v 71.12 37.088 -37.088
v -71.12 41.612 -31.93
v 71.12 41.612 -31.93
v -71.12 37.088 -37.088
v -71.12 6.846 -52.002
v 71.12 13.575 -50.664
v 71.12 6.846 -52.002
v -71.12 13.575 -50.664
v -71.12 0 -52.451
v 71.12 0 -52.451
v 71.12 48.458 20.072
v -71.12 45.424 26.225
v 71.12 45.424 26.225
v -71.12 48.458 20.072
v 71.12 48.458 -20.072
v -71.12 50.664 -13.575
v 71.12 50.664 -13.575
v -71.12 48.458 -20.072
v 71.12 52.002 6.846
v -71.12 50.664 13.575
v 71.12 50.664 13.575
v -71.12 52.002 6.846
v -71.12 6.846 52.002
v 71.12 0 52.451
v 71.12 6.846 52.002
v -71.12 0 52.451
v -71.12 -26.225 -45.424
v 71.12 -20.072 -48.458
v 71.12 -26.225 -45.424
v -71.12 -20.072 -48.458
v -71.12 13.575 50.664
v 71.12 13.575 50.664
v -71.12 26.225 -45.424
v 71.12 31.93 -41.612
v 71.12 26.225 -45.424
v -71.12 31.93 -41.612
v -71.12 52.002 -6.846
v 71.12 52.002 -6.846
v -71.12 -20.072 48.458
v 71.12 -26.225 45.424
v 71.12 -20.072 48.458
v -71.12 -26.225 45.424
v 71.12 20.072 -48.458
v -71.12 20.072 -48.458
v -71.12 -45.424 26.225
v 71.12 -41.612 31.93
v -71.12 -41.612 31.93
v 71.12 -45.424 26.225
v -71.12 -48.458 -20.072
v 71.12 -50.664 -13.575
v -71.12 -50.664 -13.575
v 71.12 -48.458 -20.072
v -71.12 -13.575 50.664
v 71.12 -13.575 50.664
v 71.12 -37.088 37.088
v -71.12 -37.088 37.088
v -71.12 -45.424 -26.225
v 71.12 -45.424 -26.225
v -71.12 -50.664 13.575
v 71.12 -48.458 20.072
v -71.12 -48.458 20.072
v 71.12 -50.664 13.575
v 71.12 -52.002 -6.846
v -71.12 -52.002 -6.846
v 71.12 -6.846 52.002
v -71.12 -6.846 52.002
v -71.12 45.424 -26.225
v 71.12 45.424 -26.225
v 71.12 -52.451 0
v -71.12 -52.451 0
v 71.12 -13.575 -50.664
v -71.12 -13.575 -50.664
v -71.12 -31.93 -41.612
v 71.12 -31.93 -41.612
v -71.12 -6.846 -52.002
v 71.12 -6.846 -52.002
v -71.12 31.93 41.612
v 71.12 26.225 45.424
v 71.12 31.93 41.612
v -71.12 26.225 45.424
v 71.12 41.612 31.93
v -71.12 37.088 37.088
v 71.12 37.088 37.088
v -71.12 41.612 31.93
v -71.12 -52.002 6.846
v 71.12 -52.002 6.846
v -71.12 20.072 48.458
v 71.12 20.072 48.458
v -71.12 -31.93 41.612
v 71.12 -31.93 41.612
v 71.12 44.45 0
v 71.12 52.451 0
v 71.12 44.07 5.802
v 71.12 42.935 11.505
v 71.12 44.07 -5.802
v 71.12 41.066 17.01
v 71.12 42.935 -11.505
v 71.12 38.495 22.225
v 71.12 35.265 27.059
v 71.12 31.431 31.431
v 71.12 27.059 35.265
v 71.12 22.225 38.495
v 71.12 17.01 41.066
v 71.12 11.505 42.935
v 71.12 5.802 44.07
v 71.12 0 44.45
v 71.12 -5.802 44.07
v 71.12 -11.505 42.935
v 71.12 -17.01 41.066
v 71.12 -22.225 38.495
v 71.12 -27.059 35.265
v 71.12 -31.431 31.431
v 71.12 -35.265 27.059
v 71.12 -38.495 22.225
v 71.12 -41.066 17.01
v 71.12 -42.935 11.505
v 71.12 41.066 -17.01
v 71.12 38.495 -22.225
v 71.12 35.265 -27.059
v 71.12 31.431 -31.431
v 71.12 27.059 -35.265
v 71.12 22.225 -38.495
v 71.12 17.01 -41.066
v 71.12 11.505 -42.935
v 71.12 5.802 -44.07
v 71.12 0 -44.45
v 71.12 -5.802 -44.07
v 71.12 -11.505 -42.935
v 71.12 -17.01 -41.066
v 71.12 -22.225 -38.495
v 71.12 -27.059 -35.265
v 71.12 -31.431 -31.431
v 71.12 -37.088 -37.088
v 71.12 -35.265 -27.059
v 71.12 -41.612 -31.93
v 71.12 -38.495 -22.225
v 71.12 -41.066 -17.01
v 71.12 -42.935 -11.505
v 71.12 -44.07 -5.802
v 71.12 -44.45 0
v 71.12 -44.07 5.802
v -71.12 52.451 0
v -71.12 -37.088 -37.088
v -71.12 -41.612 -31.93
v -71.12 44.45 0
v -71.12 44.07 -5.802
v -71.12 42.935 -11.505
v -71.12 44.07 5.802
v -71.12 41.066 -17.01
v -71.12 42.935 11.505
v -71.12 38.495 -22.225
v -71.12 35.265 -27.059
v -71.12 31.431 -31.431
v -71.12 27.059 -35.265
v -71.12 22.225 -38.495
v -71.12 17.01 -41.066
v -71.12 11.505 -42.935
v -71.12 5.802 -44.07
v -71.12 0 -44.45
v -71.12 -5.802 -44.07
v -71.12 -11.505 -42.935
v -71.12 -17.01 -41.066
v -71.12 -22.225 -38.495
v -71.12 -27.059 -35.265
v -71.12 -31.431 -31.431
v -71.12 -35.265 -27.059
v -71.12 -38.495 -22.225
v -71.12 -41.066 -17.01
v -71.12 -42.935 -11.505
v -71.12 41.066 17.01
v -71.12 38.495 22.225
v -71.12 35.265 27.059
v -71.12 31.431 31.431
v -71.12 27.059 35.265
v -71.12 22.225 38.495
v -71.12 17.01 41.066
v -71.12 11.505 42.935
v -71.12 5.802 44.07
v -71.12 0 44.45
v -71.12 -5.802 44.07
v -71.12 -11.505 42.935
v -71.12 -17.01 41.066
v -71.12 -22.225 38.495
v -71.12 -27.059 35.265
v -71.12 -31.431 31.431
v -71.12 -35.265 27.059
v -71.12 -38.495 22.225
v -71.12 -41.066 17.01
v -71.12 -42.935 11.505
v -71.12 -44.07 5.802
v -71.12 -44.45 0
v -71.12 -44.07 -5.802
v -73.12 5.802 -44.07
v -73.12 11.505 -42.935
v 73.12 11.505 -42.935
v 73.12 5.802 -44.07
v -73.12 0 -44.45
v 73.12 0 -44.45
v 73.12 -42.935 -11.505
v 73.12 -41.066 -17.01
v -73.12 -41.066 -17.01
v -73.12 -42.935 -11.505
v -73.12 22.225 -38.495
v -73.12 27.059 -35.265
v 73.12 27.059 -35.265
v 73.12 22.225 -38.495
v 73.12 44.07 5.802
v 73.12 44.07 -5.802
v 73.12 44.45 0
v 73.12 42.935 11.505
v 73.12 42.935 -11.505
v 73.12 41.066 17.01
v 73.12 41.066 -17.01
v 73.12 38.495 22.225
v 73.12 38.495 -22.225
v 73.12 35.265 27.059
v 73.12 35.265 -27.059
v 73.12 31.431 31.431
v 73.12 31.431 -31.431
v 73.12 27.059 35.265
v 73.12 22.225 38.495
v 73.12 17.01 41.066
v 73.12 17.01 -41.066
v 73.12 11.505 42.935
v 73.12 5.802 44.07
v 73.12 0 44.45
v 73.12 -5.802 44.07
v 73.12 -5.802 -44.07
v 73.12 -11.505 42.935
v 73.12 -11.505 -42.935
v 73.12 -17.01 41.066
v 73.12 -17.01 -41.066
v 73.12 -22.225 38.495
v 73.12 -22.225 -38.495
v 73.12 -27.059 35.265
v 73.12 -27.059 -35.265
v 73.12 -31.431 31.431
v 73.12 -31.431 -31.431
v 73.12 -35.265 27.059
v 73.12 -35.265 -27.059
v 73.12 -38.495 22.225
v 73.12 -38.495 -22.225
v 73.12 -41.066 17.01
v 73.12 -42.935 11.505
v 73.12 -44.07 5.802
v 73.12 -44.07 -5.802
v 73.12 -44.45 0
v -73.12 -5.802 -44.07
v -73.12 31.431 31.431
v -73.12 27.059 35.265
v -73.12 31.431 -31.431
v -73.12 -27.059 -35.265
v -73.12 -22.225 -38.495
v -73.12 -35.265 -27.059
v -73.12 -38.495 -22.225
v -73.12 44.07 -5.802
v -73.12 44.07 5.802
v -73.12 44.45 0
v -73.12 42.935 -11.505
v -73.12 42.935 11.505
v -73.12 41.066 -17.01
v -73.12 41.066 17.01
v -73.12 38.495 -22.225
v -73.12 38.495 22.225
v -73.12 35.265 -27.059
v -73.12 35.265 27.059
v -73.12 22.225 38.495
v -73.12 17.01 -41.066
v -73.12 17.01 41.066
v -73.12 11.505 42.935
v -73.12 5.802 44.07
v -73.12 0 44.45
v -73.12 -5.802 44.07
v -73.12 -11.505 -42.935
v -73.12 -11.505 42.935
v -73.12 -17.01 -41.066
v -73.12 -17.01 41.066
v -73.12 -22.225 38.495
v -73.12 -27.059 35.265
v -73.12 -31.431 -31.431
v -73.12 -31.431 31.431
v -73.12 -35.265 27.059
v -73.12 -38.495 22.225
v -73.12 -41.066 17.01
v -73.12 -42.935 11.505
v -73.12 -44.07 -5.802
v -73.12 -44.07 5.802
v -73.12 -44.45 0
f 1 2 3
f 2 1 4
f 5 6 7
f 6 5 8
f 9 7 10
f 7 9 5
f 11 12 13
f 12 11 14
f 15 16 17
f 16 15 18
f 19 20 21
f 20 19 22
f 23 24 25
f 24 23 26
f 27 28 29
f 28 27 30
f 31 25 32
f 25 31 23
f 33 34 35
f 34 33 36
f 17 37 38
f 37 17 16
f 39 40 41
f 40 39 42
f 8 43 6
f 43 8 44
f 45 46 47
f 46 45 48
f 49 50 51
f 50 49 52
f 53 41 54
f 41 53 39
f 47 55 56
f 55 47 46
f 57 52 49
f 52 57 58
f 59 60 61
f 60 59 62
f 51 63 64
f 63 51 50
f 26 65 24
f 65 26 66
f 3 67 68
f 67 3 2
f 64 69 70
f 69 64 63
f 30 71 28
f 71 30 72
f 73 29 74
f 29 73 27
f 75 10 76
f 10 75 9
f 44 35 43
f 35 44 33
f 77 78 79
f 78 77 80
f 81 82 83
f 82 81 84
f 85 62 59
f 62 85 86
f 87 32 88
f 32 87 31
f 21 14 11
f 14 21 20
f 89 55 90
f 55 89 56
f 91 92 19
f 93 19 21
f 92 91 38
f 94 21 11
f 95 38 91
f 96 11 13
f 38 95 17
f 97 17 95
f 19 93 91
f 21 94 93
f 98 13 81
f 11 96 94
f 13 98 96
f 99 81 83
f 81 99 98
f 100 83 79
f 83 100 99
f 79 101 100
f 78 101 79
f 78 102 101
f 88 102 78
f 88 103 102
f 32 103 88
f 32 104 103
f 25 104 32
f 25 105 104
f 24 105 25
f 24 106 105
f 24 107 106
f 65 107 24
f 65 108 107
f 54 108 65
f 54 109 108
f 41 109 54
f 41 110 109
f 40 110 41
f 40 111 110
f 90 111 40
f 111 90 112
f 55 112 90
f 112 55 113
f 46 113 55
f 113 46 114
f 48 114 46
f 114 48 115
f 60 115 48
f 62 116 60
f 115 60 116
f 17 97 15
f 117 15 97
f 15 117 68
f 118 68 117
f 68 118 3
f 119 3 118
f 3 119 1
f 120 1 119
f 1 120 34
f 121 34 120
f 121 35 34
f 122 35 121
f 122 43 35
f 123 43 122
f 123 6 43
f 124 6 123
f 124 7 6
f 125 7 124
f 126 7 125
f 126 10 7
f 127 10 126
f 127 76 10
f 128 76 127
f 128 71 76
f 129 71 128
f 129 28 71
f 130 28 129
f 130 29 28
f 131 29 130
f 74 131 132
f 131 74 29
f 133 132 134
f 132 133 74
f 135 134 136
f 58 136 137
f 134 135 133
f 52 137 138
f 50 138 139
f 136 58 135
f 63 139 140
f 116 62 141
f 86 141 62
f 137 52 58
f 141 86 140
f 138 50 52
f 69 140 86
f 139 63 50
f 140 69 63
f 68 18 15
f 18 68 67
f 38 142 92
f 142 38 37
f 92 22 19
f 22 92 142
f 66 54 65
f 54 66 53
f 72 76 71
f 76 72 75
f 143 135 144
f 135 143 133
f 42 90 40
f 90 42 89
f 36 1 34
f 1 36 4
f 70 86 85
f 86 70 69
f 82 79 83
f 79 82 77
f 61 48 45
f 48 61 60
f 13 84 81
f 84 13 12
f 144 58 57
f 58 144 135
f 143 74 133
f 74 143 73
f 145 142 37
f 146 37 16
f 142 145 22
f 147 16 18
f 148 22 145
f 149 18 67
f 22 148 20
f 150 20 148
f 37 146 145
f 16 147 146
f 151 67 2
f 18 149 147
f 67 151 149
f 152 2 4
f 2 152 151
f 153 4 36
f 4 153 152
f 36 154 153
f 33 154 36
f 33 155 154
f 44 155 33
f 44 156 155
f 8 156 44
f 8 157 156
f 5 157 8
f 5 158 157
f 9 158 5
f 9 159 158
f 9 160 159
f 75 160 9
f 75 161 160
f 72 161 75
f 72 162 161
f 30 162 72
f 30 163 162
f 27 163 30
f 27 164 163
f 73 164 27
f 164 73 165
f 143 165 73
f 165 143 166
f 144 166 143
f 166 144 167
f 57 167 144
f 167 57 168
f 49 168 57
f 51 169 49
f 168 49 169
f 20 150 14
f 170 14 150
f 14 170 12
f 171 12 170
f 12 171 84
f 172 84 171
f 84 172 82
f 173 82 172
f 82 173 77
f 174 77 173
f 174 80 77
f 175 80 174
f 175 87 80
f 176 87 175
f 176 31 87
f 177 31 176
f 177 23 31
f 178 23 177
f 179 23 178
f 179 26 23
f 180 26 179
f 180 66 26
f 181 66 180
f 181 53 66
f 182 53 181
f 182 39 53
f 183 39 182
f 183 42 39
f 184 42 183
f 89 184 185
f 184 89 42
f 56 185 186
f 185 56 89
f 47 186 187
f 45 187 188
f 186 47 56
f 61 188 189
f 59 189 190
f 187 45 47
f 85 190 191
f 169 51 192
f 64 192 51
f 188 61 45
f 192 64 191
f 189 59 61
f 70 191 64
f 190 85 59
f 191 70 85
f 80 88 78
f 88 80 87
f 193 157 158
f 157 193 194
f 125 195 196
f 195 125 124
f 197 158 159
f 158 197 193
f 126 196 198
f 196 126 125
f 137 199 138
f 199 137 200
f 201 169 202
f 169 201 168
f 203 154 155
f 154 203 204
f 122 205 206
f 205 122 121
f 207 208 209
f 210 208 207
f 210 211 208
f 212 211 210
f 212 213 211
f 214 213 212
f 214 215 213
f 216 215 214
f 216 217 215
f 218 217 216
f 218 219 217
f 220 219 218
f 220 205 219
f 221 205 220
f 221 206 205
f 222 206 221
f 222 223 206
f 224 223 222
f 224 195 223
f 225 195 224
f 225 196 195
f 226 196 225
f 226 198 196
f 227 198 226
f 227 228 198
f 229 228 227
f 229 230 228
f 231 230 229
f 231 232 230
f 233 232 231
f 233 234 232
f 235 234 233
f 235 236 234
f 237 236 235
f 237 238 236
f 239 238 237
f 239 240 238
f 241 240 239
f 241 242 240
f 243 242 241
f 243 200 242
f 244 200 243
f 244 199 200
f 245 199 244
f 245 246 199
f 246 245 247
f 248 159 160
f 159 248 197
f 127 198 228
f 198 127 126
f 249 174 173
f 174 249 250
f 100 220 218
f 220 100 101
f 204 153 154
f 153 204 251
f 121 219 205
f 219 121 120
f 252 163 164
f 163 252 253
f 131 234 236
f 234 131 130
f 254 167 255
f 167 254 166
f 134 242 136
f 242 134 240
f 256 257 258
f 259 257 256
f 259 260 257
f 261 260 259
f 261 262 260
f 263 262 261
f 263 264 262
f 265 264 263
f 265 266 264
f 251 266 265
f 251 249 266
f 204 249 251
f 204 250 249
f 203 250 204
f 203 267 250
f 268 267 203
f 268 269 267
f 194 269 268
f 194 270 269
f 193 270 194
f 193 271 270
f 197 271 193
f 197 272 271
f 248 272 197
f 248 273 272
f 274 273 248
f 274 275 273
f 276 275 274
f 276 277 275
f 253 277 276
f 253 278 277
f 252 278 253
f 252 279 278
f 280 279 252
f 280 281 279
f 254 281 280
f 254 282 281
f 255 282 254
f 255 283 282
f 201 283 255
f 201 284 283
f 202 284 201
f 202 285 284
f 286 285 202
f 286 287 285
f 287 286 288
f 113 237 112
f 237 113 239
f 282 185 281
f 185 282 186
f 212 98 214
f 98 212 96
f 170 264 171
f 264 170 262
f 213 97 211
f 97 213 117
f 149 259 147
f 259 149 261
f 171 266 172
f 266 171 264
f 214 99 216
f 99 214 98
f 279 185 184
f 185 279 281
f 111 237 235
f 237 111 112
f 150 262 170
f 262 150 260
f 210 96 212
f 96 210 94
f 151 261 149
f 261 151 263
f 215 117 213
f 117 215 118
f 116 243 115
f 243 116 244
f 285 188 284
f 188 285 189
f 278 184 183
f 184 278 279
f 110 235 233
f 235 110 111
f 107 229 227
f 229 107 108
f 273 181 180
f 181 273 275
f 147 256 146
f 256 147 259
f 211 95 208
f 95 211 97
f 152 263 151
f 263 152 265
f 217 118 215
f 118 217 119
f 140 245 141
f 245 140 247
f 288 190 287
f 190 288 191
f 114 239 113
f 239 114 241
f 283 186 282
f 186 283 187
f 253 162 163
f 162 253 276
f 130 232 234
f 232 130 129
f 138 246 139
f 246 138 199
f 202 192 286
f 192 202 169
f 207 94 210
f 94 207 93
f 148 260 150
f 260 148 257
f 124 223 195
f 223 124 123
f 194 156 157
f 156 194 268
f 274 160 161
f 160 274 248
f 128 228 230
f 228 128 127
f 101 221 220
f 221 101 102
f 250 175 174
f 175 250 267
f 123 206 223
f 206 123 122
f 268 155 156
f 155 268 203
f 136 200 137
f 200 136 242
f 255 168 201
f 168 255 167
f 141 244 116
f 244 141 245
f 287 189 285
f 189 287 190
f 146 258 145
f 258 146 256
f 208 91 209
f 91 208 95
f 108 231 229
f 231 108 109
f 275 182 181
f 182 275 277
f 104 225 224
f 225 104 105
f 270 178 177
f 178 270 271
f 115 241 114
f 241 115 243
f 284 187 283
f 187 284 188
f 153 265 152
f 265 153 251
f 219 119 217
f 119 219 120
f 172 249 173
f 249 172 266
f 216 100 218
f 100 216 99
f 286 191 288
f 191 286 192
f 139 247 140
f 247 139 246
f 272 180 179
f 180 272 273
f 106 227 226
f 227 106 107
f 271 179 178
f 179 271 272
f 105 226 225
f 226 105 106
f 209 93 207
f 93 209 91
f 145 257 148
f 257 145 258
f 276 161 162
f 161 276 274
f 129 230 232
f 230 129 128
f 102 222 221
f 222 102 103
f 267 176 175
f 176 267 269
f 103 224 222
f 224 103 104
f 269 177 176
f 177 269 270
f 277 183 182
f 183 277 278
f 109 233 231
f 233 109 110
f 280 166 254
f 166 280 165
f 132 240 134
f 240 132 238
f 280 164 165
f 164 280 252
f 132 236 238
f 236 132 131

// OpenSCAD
// Auto-generated by scripts/author_from_manifest.py (Phase D.3).
// Source: data/phase_d_manifest.json (sku_intent='victaulic-005-rigid-coupling-3in').
// Do not hand-edit — regenerate from the manifest.
//
// @part victaulic_005_rigid_coupling_3in
// @kind fitting
// @category fitting.coupling
// @display-name "Victaulic FireLock Style 005 Rigid Coupling 3\""
// @mfg victaulic
// @mfg-pn Style_005_3in
// @listing UL FM
// @price-usd 36.00
// @install-minutes 6
// @crew journeyman
// @param size_in number default=3 label="Size" unit="in"
// @port inlet position=[-0.05,0,0] direction=[-1,0,0] style=grooved size_in=3 role=run_a
// @port outlet position=[0.05,0,0] direction=[1,0,0] style=grooved size_in=3 role=run_b

size_in = 3.0;

function od_mm(nps) =
    nps ==   1  ? 33.4 :
    nps == 1.25 ? 42.2 :
    nps == 1.5  ? 48.3 :
    nps ==   2  ? 60.3 :
    nps == 2.5  ? 73.0 :
    nps ==   3  ? 88.9 :
    nps ==   4  ? 114.3 :
    nps ==   5  ? 141.3 :
    nps ==   6  ? 168.3 :
    nps ==   8  ? 219.1 :
    nps ==  10  ? 273.0 : 60.3;

od = od_mm(size_in);
len_mm = od * 1.6;

rotate([0, 90, 0])
    union() {
        cylinder(h = len_mm, d = od * 1.18, center = true, $fn = 48);
        cylinder(h = len_mm + 4, d = od, center = true, $fn = 48);
    }
